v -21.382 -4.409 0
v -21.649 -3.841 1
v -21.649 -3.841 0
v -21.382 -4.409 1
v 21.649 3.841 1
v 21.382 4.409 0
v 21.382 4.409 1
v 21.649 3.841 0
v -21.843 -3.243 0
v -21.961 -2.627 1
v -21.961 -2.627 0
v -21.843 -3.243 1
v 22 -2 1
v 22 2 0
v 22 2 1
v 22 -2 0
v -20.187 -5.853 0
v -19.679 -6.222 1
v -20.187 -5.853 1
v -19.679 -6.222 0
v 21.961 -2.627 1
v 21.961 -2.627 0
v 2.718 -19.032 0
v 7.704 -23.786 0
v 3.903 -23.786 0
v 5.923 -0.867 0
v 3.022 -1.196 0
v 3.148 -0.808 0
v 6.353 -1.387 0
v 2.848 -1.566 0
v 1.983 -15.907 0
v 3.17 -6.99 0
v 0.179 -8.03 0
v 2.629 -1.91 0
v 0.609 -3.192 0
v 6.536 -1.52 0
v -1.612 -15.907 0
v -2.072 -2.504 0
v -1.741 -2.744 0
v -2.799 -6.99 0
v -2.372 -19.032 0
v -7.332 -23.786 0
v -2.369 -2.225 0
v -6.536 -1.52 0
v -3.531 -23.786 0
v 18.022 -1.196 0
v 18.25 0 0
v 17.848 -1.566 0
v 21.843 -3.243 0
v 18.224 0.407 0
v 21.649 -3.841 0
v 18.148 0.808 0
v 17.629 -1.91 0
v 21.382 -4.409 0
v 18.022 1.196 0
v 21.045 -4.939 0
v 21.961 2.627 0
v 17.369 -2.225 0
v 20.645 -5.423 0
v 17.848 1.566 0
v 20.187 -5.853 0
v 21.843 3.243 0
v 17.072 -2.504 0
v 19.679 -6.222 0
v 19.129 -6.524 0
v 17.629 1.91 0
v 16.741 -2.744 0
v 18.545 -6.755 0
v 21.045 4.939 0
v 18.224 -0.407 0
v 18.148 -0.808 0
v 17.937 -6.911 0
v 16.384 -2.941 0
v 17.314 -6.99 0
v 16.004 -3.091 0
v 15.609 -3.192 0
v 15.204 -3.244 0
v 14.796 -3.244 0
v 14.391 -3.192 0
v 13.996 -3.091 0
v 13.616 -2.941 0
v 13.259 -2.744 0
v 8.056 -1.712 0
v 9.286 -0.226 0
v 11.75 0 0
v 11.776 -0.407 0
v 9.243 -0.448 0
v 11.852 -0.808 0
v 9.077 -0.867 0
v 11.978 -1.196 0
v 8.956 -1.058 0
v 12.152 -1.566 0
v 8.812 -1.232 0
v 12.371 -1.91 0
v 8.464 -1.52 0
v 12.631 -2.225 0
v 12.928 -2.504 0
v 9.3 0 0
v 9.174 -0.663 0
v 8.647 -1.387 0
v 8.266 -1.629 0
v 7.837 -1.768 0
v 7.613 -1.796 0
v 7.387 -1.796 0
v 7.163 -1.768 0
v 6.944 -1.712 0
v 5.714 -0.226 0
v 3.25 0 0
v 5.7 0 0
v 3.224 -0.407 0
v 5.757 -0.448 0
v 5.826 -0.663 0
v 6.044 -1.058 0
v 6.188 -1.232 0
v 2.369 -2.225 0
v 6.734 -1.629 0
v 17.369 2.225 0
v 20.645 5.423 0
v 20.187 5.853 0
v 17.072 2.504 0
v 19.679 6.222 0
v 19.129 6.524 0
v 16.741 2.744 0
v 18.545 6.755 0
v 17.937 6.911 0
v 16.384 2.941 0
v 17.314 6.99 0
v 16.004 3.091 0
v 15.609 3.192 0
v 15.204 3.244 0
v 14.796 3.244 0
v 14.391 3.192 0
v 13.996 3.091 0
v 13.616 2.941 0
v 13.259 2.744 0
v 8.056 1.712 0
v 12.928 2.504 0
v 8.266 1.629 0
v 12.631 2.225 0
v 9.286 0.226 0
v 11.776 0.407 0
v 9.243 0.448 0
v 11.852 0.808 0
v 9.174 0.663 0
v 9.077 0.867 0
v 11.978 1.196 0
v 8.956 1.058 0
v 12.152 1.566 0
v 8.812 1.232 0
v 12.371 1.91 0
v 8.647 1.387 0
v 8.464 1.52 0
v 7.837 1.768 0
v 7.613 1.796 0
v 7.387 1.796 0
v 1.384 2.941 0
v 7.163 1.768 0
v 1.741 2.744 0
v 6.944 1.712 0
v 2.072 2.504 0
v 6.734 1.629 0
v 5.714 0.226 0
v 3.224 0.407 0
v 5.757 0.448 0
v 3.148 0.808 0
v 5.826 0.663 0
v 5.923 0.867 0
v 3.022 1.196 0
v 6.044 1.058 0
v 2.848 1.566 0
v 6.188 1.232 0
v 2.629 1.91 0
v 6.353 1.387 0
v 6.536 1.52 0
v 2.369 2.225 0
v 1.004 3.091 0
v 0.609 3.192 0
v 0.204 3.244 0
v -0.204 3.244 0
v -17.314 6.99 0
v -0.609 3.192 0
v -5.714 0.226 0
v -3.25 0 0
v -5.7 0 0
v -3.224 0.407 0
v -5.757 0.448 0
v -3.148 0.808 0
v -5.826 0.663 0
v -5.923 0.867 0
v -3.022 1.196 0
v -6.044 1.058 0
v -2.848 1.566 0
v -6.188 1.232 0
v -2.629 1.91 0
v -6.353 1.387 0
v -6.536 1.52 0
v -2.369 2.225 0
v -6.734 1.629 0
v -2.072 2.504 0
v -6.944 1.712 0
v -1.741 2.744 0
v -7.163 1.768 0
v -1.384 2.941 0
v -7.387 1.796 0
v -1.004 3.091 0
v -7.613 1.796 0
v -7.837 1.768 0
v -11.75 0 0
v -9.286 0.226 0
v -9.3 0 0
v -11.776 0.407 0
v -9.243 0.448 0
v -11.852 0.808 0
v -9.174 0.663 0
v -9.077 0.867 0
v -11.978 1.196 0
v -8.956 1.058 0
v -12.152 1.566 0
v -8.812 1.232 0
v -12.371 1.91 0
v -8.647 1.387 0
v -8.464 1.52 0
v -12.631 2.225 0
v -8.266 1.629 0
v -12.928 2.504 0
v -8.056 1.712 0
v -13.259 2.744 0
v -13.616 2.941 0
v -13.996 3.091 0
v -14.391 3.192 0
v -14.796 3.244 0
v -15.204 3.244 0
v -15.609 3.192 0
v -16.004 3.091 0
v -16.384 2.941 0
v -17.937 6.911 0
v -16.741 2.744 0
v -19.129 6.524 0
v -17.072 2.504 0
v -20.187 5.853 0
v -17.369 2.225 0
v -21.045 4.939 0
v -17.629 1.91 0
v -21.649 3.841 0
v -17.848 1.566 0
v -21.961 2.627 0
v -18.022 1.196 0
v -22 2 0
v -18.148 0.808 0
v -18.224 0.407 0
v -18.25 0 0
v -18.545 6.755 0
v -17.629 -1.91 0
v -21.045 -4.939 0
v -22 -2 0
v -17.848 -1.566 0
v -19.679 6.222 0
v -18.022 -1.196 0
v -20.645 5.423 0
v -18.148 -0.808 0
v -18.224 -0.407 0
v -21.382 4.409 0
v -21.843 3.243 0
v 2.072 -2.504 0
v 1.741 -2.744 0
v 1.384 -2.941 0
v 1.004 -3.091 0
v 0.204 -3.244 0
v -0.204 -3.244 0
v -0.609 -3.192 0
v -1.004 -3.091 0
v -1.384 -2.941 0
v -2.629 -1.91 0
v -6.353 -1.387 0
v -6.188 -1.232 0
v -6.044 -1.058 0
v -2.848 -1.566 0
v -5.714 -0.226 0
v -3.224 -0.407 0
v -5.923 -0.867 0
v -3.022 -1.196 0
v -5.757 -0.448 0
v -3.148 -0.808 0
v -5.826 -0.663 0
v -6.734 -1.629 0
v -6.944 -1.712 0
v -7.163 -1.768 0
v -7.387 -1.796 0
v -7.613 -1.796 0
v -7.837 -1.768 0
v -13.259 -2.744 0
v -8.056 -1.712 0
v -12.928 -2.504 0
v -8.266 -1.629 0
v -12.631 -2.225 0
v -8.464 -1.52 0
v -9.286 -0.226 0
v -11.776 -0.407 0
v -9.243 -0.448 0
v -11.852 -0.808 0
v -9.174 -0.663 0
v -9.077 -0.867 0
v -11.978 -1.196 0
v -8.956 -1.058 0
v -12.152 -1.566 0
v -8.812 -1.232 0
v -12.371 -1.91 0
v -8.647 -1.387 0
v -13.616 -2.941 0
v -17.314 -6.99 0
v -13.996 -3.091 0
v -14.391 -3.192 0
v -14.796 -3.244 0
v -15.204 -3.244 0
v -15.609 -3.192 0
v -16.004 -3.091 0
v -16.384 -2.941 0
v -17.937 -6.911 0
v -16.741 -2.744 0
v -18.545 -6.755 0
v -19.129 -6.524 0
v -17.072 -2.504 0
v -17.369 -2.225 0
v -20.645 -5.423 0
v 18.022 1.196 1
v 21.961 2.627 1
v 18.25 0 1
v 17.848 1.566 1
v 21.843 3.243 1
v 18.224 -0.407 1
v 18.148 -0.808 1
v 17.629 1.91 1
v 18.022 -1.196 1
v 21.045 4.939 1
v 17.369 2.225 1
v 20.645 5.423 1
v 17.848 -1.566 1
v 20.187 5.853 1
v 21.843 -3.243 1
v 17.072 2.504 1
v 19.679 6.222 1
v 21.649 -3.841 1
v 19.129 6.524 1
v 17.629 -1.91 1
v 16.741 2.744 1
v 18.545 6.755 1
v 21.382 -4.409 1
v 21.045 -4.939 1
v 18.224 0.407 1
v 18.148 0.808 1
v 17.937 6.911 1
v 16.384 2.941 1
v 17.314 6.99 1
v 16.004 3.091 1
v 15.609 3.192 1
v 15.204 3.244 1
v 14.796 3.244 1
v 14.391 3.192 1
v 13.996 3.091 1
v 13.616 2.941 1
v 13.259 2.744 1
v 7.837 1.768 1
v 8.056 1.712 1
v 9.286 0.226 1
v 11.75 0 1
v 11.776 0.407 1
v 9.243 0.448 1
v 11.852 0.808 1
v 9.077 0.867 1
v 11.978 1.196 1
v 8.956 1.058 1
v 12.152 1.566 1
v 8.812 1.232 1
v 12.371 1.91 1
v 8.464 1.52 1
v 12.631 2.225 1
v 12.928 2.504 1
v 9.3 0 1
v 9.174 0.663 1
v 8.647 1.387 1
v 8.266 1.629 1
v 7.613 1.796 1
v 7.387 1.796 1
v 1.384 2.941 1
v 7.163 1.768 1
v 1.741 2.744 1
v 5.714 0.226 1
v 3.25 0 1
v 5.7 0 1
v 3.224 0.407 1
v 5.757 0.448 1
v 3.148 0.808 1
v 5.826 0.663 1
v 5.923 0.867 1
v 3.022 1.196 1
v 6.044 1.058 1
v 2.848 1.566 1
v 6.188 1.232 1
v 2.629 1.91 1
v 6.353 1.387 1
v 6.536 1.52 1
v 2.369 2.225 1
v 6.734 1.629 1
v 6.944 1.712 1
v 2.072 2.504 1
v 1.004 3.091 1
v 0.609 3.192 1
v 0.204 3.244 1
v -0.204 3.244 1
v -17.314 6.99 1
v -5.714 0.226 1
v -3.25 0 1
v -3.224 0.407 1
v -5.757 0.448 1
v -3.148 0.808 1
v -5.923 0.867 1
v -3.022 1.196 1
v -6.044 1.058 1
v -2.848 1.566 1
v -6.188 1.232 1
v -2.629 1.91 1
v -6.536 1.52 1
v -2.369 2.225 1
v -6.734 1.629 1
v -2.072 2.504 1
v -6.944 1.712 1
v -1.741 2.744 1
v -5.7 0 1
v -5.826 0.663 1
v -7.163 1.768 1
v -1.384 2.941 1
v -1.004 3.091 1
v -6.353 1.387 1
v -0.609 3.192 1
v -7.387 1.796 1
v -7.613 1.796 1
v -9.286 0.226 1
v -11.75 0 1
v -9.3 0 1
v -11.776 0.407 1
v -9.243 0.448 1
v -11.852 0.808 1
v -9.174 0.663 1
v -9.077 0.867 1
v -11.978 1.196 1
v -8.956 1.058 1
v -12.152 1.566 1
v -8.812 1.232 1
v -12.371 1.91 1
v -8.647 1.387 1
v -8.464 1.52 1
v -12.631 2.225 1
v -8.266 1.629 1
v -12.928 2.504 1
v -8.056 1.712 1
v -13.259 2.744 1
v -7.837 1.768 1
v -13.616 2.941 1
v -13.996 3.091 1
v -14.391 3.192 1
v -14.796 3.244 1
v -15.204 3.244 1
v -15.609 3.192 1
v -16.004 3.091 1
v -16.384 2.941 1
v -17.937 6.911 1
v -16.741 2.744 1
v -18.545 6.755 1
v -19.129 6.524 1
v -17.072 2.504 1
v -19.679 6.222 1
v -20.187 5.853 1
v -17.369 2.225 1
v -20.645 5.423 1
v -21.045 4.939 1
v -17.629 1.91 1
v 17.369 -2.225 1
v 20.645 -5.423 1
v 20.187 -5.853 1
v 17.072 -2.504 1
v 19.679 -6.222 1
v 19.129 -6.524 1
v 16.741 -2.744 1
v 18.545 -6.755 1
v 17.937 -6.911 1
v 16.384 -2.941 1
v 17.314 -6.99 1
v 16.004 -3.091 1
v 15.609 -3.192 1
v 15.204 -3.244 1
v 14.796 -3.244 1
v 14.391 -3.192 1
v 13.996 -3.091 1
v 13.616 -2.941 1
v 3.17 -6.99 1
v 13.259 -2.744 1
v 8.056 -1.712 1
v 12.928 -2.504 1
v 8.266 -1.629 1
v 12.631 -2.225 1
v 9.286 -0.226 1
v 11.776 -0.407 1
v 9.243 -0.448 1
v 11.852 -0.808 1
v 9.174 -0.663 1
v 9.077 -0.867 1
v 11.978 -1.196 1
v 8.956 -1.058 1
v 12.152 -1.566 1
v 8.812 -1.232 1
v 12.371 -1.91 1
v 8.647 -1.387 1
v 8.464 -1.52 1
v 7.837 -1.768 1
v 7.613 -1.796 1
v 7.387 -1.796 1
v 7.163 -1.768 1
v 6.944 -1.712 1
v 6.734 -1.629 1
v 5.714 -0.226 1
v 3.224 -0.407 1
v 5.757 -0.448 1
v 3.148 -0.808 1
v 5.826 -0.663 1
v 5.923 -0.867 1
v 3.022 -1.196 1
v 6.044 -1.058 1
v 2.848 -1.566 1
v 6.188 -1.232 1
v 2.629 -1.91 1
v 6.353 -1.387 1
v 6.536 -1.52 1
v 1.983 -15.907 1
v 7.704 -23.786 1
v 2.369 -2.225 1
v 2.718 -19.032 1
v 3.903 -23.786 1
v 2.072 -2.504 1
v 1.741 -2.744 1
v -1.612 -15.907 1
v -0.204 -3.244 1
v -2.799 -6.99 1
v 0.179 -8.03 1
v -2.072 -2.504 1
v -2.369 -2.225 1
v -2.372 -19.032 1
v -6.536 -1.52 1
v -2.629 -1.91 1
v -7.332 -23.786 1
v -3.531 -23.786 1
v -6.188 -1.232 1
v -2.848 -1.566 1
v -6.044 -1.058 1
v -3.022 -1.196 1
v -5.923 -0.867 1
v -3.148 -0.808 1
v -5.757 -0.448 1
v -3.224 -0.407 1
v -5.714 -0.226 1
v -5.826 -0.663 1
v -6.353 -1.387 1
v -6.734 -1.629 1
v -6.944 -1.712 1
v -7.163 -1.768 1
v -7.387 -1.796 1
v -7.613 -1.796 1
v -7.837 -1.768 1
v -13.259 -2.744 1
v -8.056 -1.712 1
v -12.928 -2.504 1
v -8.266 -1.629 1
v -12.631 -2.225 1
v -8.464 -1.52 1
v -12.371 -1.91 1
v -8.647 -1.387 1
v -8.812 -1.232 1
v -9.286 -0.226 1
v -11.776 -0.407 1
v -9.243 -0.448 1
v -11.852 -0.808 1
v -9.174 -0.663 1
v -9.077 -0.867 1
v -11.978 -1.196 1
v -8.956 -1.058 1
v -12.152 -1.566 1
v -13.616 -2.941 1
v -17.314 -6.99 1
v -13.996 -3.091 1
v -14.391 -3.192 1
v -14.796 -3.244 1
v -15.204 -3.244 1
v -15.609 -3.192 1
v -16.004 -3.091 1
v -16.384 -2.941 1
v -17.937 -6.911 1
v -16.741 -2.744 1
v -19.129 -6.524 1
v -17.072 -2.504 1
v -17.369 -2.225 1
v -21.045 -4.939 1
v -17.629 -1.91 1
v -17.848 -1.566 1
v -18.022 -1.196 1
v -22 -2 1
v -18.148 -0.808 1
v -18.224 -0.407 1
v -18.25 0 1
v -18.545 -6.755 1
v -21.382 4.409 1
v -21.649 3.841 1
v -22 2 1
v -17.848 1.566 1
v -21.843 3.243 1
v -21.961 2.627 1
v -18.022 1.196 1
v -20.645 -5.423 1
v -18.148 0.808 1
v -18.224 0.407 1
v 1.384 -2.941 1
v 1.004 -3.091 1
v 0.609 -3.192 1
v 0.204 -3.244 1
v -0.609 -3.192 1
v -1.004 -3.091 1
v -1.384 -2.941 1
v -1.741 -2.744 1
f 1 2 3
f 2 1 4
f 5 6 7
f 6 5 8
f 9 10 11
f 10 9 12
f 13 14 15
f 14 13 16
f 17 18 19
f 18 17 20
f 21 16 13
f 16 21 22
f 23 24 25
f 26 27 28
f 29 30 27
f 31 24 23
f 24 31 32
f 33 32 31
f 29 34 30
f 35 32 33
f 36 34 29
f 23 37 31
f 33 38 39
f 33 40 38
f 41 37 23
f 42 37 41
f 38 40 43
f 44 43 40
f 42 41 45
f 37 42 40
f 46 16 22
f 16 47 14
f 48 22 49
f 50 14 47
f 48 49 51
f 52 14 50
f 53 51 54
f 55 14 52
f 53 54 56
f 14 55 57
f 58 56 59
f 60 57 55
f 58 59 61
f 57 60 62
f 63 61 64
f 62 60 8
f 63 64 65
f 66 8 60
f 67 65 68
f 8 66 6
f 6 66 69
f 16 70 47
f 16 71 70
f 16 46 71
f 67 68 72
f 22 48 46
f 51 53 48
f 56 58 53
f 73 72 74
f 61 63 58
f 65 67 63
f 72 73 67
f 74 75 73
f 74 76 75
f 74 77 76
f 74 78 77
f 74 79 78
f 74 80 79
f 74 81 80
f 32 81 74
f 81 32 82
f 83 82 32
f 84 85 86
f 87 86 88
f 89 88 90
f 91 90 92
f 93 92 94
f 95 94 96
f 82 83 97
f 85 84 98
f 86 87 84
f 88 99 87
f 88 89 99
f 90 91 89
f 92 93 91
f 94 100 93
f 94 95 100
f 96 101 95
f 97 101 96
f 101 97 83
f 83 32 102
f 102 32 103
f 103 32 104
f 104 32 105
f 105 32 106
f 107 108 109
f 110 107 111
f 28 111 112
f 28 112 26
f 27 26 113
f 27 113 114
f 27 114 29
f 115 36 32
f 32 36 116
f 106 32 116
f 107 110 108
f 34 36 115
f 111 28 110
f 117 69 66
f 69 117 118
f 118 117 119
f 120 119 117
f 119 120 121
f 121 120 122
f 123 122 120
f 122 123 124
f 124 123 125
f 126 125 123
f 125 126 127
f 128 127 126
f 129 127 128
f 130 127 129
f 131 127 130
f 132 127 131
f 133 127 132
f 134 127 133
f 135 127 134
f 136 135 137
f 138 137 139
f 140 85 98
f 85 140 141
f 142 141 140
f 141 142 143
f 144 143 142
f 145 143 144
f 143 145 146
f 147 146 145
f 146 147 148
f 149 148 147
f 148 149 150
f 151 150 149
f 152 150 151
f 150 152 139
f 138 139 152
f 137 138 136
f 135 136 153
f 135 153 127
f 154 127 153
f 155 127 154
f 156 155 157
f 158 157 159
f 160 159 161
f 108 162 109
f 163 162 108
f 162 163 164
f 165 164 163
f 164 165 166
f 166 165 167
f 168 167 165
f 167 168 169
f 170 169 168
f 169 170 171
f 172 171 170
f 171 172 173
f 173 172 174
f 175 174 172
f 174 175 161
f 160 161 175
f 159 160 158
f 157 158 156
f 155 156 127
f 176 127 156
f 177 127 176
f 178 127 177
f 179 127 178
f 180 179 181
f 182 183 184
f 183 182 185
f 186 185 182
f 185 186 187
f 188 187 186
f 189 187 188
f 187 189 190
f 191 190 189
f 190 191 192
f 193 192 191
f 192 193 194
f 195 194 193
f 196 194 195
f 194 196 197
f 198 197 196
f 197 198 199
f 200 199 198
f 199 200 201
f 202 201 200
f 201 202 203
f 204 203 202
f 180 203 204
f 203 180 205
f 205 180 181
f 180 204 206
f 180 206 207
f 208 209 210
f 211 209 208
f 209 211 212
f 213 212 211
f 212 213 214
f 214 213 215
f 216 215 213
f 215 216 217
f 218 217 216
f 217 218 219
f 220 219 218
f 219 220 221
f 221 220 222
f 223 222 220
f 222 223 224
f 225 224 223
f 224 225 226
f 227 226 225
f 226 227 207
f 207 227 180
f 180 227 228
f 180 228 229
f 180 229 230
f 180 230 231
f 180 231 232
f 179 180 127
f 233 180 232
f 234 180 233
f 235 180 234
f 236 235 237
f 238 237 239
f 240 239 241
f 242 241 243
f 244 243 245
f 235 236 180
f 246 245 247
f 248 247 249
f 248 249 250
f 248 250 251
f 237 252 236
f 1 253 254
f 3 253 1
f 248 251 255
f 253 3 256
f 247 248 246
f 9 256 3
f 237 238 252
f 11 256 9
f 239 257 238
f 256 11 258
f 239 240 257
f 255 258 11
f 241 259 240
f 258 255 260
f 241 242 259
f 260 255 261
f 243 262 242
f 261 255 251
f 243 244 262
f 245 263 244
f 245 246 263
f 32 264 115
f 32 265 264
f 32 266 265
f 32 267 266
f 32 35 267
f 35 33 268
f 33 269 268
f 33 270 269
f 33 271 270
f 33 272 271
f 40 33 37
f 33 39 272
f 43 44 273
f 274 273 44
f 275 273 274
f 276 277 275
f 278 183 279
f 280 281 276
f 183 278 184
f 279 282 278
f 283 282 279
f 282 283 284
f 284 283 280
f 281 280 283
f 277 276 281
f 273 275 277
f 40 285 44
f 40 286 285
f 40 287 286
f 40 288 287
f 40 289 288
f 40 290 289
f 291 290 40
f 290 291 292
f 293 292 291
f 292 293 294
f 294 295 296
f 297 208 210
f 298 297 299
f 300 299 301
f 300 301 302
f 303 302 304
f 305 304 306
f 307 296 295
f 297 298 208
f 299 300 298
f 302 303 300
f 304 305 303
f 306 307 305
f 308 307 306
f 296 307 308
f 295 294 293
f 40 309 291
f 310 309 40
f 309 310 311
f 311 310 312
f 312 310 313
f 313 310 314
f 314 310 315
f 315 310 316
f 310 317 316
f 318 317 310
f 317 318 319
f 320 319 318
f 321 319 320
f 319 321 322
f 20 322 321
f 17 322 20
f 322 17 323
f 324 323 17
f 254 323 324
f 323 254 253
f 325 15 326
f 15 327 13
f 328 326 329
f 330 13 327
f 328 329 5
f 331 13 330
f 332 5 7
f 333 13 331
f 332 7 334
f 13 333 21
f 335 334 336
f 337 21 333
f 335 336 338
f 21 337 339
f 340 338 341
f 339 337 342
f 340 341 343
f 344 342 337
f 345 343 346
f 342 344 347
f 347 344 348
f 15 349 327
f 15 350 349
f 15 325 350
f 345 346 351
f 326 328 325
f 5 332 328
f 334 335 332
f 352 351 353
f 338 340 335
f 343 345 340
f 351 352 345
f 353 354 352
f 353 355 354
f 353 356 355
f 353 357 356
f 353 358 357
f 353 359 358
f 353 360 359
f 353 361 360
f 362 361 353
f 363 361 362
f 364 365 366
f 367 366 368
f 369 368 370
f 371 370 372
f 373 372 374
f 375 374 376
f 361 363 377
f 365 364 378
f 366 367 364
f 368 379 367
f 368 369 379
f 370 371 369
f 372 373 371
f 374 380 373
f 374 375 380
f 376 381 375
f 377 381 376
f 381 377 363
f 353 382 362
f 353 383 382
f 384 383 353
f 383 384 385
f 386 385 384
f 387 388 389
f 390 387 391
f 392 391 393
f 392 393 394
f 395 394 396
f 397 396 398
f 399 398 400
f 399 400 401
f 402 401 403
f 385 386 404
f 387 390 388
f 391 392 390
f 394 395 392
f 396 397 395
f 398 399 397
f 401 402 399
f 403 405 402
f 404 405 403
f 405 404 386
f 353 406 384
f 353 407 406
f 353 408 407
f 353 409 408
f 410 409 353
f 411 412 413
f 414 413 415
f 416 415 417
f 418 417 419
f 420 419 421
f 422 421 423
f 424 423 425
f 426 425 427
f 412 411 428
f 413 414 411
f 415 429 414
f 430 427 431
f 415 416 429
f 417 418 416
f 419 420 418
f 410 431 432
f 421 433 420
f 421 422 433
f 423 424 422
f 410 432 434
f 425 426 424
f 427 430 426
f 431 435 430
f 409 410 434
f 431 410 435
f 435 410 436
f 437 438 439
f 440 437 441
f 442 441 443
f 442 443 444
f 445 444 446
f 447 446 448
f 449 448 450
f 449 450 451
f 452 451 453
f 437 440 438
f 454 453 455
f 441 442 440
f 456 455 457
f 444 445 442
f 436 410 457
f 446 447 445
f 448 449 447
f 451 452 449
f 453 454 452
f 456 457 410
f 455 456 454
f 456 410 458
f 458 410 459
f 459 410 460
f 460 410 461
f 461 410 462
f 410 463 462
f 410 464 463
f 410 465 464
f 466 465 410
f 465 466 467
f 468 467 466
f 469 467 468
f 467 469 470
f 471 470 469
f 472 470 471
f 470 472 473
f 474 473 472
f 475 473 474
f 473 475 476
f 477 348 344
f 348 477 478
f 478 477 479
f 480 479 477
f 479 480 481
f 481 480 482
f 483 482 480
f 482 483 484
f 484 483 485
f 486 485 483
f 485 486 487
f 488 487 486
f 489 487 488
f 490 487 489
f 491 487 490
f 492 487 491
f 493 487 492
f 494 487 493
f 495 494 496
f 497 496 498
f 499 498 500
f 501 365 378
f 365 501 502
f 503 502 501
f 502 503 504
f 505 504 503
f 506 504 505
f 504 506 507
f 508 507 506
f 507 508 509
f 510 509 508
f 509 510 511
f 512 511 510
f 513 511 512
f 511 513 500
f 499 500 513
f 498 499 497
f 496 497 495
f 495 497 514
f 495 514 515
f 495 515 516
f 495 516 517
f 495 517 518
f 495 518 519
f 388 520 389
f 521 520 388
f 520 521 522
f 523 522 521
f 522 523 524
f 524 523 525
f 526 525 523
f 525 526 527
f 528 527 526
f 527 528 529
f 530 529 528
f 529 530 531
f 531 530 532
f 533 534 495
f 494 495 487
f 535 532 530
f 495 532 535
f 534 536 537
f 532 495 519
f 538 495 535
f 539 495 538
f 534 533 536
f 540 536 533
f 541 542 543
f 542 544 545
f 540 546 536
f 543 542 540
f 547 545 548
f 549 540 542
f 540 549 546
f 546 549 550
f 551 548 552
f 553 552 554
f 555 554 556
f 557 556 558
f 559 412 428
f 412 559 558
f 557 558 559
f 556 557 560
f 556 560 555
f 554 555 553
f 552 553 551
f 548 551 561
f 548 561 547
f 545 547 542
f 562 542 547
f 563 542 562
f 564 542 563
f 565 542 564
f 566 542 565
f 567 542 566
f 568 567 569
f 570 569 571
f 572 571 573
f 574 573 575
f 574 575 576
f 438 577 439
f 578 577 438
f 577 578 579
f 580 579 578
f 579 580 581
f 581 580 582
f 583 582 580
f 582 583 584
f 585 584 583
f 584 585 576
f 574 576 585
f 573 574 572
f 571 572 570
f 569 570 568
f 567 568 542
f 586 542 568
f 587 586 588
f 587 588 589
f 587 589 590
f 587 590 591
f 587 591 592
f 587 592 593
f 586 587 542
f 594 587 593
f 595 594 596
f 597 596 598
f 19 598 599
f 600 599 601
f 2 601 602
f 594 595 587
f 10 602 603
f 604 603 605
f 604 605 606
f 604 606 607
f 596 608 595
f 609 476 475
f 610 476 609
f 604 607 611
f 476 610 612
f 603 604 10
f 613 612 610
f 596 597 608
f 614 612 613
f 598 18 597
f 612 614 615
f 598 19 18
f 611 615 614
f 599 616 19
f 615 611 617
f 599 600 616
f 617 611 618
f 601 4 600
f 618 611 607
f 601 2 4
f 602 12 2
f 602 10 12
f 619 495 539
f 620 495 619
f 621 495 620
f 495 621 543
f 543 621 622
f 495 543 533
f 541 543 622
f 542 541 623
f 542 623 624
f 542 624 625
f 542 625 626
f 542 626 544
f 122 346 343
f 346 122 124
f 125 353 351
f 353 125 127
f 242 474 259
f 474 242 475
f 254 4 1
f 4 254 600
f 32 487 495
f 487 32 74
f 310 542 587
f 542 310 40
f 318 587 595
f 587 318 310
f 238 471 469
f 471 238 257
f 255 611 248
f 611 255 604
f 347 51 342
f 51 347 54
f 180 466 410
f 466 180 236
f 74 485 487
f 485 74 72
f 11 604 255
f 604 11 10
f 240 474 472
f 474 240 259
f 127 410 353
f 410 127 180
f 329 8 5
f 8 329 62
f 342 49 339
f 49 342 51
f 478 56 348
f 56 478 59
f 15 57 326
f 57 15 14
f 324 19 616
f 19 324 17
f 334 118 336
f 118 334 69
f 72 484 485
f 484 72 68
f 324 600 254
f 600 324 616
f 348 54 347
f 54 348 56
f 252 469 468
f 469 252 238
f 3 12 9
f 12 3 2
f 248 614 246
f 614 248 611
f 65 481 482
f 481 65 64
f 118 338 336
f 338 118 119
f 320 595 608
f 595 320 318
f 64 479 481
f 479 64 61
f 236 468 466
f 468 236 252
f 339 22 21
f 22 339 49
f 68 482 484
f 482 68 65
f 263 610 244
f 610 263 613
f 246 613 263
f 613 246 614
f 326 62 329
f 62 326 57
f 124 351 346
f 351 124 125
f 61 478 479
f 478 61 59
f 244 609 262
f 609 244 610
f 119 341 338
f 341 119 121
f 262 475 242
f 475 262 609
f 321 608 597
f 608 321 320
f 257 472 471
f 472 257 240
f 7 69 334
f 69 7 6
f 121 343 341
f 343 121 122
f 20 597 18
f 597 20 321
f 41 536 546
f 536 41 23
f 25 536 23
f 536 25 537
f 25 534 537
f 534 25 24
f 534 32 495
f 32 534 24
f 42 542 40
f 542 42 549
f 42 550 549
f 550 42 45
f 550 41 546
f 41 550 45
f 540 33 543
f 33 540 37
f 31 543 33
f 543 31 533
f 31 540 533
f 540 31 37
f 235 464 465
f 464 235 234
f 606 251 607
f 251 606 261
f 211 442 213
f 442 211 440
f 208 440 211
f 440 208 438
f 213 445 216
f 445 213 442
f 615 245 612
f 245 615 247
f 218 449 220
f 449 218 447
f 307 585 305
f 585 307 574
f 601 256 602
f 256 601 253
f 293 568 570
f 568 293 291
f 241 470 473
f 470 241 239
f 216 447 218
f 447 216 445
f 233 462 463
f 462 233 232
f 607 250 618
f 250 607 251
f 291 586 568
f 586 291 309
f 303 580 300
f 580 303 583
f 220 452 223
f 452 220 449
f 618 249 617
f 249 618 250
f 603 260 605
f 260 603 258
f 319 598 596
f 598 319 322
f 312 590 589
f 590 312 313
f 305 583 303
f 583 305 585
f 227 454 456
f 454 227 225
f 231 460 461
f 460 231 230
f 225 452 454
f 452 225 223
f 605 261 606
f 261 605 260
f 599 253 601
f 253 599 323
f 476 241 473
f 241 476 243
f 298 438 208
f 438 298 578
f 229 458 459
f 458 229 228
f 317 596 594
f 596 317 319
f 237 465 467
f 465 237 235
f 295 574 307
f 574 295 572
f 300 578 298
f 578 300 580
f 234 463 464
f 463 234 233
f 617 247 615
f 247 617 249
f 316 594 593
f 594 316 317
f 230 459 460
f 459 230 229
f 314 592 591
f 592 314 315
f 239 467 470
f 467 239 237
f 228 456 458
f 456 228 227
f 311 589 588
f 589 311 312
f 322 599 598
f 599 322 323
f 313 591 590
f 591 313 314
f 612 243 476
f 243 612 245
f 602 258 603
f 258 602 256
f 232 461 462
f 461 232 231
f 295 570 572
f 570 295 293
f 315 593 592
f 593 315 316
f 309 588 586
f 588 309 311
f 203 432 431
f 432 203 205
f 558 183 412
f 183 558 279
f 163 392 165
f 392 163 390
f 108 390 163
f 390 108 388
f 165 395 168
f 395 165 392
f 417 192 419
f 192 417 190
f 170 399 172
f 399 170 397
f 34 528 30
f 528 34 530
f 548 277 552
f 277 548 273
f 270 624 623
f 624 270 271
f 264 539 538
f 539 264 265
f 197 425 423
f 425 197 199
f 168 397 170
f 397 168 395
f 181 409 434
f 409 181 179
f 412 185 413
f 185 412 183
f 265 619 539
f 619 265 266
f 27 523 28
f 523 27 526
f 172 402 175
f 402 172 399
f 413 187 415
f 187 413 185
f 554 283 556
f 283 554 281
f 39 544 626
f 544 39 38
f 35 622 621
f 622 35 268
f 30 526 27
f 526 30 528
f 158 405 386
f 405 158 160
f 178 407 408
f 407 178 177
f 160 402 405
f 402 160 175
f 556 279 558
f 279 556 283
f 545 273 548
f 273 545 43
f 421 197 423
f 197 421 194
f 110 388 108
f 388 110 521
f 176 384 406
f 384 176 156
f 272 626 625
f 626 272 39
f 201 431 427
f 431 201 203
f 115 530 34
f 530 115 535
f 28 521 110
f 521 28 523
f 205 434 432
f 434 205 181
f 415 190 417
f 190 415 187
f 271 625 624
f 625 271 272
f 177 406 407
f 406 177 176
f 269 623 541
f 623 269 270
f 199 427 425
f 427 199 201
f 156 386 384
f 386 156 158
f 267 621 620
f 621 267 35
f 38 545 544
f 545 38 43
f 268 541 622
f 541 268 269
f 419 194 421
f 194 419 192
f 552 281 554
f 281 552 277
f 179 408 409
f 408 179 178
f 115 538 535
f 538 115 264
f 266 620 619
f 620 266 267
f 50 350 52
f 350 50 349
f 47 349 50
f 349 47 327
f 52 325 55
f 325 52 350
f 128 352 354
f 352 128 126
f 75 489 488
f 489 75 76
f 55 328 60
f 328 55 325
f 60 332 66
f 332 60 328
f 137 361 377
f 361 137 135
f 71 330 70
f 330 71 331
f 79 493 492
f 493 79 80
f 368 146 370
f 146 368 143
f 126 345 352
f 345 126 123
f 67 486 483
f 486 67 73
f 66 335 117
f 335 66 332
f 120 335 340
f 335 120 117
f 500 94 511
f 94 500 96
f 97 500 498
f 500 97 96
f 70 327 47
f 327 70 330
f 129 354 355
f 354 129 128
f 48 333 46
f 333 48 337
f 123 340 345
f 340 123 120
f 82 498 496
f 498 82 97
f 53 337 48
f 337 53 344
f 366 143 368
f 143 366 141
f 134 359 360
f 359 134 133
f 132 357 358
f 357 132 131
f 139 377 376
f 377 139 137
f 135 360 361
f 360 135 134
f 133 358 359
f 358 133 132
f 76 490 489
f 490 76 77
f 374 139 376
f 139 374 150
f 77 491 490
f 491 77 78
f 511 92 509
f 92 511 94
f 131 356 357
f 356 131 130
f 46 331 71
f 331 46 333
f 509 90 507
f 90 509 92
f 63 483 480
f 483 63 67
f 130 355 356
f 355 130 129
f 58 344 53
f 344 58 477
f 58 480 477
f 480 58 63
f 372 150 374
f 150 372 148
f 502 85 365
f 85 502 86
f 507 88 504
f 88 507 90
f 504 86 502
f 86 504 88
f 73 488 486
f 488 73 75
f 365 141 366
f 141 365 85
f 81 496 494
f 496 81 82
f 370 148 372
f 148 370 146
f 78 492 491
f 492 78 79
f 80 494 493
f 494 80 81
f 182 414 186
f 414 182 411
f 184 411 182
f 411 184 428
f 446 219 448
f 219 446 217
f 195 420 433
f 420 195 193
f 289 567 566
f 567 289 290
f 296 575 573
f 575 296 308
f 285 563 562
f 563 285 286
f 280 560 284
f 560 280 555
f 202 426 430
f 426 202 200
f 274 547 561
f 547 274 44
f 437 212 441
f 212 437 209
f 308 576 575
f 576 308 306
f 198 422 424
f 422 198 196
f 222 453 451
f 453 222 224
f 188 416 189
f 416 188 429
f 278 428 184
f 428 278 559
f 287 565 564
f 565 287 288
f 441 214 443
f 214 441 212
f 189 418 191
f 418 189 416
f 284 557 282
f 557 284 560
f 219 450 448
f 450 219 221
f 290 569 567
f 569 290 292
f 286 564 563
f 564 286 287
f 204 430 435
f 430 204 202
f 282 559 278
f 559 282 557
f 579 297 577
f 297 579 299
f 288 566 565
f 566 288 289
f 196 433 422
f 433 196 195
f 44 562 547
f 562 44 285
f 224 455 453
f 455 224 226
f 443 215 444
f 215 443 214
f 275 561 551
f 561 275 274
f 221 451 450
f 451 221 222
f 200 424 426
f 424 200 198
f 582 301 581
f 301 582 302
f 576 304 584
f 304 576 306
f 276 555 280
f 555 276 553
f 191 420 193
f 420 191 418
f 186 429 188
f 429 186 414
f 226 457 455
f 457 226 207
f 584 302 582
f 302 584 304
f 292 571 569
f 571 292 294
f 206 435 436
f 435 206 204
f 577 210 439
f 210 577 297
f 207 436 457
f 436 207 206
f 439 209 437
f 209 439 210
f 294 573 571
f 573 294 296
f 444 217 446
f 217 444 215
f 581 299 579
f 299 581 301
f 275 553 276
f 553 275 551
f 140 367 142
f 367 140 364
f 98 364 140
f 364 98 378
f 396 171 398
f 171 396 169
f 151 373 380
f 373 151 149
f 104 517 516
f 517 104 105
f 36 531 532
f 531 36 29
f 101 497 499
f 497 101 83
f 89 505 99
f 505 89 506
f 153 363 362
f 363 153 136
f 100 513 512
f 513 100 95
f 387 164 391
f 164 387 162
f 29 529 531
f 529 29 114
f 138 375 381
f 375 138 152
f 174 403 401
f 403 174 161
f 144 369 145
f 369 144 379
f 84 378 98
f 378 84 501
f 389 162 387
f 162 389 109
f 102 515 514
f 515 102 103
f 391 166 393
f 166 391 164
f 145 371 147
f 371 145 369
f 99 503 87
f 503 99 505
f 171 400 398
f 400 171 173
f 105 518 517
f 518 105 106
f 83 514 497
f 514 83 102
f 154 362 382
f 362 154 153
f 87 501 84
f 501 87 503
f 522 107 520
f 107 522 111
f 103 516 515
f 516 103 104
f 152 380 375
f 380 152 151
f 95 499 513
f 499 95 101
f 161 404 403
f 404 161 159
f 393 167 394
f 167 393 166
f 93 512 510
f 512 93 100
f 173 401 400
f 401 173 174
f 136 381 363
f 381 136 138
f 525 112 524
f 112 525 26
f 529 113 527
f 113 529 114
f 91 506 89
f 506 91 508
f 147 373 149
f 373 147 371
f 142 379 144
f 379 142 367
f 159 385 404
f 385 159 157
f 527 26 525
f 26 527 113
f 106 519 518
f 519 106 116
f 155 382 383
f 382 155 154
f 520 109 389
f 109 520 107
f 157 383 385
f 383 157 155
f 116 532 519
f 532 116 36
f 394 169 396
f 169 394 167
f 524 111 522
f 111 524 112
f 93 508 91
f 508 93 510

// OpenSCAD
$fn = 50;


difference() {
	union() {
		hull() {
			translate(v = [-17.0000000000, 2.0000000000, 0]) {
				cylinder(h = 1, r = 5);
			}
			translate(v = [17.0000000000, 2.0000000000, 0]) {
				cylinder(h = 1, r = 5);
			}
			translate(v = [-17.0000000000, -2.0000000000, 0]) {
				cylinder(h = 1, r = 5);
			}
			translate(v = [17.0000000000, -2.0000000000, 0]) {
				cylinder(h = 1, r = 5);
			}
		}
		translate(v = [0, -5, 0]) {
			linear_extrude(height = 1) {
				text(font = "DejaVu Sans Mono:style=Bold", halign = "center", size = 19.0000000000, text = "A", valign = "top");
			}
		}
	}
	union() {
		translate(v = [-15.0000000000, 0.0000000000, 0]) {
			translate(v = [0, 0, -100]) {
				cylinder(h = 200, r = 3.2500000000);
			}
		}
		translate(v = [0, 0, -100]) {
			cylinder(h = 200, r = 3.2500000000);
		}
		translate(v = [15.0000000000, 0.0000000000, 0]) {
			translate(v = [0, 0, -100]) {
				cylinder(h = 200, r = 3.2500000000);
			}
		}
		translate(v = [-15.0000000000, 0.0000000000, 0]) {
			translate(v = [0, 0, -100]) {
				cylinder(h = 200, r = 1.8000000000);
			}
		}
		translate(v = [-7.5000000000, 0.0000000000, 0]) {
			translate(v = [0, 0, -100]) {
				cylinder(h = 200, r = 1.8000000000);
			}
		}
		translate(v = [0, 0, -100]) {
			cylinder(h = 200, r = 1.8000000000);
		}
		translate(v = [7.5000000000, 0.0000000000, 0]) {
			translate(v = [0, 0, -100]) {
				cylinder(h = 200, r = 1.8000000000);
			}
		}
		translate(v = [15.0000000000, 0.0000000000, 0]) {
			translate(v = [0, 0, -100]) {
				cylinder(h = 200, r = 1.8000000000);
			}
		}
	}
}
